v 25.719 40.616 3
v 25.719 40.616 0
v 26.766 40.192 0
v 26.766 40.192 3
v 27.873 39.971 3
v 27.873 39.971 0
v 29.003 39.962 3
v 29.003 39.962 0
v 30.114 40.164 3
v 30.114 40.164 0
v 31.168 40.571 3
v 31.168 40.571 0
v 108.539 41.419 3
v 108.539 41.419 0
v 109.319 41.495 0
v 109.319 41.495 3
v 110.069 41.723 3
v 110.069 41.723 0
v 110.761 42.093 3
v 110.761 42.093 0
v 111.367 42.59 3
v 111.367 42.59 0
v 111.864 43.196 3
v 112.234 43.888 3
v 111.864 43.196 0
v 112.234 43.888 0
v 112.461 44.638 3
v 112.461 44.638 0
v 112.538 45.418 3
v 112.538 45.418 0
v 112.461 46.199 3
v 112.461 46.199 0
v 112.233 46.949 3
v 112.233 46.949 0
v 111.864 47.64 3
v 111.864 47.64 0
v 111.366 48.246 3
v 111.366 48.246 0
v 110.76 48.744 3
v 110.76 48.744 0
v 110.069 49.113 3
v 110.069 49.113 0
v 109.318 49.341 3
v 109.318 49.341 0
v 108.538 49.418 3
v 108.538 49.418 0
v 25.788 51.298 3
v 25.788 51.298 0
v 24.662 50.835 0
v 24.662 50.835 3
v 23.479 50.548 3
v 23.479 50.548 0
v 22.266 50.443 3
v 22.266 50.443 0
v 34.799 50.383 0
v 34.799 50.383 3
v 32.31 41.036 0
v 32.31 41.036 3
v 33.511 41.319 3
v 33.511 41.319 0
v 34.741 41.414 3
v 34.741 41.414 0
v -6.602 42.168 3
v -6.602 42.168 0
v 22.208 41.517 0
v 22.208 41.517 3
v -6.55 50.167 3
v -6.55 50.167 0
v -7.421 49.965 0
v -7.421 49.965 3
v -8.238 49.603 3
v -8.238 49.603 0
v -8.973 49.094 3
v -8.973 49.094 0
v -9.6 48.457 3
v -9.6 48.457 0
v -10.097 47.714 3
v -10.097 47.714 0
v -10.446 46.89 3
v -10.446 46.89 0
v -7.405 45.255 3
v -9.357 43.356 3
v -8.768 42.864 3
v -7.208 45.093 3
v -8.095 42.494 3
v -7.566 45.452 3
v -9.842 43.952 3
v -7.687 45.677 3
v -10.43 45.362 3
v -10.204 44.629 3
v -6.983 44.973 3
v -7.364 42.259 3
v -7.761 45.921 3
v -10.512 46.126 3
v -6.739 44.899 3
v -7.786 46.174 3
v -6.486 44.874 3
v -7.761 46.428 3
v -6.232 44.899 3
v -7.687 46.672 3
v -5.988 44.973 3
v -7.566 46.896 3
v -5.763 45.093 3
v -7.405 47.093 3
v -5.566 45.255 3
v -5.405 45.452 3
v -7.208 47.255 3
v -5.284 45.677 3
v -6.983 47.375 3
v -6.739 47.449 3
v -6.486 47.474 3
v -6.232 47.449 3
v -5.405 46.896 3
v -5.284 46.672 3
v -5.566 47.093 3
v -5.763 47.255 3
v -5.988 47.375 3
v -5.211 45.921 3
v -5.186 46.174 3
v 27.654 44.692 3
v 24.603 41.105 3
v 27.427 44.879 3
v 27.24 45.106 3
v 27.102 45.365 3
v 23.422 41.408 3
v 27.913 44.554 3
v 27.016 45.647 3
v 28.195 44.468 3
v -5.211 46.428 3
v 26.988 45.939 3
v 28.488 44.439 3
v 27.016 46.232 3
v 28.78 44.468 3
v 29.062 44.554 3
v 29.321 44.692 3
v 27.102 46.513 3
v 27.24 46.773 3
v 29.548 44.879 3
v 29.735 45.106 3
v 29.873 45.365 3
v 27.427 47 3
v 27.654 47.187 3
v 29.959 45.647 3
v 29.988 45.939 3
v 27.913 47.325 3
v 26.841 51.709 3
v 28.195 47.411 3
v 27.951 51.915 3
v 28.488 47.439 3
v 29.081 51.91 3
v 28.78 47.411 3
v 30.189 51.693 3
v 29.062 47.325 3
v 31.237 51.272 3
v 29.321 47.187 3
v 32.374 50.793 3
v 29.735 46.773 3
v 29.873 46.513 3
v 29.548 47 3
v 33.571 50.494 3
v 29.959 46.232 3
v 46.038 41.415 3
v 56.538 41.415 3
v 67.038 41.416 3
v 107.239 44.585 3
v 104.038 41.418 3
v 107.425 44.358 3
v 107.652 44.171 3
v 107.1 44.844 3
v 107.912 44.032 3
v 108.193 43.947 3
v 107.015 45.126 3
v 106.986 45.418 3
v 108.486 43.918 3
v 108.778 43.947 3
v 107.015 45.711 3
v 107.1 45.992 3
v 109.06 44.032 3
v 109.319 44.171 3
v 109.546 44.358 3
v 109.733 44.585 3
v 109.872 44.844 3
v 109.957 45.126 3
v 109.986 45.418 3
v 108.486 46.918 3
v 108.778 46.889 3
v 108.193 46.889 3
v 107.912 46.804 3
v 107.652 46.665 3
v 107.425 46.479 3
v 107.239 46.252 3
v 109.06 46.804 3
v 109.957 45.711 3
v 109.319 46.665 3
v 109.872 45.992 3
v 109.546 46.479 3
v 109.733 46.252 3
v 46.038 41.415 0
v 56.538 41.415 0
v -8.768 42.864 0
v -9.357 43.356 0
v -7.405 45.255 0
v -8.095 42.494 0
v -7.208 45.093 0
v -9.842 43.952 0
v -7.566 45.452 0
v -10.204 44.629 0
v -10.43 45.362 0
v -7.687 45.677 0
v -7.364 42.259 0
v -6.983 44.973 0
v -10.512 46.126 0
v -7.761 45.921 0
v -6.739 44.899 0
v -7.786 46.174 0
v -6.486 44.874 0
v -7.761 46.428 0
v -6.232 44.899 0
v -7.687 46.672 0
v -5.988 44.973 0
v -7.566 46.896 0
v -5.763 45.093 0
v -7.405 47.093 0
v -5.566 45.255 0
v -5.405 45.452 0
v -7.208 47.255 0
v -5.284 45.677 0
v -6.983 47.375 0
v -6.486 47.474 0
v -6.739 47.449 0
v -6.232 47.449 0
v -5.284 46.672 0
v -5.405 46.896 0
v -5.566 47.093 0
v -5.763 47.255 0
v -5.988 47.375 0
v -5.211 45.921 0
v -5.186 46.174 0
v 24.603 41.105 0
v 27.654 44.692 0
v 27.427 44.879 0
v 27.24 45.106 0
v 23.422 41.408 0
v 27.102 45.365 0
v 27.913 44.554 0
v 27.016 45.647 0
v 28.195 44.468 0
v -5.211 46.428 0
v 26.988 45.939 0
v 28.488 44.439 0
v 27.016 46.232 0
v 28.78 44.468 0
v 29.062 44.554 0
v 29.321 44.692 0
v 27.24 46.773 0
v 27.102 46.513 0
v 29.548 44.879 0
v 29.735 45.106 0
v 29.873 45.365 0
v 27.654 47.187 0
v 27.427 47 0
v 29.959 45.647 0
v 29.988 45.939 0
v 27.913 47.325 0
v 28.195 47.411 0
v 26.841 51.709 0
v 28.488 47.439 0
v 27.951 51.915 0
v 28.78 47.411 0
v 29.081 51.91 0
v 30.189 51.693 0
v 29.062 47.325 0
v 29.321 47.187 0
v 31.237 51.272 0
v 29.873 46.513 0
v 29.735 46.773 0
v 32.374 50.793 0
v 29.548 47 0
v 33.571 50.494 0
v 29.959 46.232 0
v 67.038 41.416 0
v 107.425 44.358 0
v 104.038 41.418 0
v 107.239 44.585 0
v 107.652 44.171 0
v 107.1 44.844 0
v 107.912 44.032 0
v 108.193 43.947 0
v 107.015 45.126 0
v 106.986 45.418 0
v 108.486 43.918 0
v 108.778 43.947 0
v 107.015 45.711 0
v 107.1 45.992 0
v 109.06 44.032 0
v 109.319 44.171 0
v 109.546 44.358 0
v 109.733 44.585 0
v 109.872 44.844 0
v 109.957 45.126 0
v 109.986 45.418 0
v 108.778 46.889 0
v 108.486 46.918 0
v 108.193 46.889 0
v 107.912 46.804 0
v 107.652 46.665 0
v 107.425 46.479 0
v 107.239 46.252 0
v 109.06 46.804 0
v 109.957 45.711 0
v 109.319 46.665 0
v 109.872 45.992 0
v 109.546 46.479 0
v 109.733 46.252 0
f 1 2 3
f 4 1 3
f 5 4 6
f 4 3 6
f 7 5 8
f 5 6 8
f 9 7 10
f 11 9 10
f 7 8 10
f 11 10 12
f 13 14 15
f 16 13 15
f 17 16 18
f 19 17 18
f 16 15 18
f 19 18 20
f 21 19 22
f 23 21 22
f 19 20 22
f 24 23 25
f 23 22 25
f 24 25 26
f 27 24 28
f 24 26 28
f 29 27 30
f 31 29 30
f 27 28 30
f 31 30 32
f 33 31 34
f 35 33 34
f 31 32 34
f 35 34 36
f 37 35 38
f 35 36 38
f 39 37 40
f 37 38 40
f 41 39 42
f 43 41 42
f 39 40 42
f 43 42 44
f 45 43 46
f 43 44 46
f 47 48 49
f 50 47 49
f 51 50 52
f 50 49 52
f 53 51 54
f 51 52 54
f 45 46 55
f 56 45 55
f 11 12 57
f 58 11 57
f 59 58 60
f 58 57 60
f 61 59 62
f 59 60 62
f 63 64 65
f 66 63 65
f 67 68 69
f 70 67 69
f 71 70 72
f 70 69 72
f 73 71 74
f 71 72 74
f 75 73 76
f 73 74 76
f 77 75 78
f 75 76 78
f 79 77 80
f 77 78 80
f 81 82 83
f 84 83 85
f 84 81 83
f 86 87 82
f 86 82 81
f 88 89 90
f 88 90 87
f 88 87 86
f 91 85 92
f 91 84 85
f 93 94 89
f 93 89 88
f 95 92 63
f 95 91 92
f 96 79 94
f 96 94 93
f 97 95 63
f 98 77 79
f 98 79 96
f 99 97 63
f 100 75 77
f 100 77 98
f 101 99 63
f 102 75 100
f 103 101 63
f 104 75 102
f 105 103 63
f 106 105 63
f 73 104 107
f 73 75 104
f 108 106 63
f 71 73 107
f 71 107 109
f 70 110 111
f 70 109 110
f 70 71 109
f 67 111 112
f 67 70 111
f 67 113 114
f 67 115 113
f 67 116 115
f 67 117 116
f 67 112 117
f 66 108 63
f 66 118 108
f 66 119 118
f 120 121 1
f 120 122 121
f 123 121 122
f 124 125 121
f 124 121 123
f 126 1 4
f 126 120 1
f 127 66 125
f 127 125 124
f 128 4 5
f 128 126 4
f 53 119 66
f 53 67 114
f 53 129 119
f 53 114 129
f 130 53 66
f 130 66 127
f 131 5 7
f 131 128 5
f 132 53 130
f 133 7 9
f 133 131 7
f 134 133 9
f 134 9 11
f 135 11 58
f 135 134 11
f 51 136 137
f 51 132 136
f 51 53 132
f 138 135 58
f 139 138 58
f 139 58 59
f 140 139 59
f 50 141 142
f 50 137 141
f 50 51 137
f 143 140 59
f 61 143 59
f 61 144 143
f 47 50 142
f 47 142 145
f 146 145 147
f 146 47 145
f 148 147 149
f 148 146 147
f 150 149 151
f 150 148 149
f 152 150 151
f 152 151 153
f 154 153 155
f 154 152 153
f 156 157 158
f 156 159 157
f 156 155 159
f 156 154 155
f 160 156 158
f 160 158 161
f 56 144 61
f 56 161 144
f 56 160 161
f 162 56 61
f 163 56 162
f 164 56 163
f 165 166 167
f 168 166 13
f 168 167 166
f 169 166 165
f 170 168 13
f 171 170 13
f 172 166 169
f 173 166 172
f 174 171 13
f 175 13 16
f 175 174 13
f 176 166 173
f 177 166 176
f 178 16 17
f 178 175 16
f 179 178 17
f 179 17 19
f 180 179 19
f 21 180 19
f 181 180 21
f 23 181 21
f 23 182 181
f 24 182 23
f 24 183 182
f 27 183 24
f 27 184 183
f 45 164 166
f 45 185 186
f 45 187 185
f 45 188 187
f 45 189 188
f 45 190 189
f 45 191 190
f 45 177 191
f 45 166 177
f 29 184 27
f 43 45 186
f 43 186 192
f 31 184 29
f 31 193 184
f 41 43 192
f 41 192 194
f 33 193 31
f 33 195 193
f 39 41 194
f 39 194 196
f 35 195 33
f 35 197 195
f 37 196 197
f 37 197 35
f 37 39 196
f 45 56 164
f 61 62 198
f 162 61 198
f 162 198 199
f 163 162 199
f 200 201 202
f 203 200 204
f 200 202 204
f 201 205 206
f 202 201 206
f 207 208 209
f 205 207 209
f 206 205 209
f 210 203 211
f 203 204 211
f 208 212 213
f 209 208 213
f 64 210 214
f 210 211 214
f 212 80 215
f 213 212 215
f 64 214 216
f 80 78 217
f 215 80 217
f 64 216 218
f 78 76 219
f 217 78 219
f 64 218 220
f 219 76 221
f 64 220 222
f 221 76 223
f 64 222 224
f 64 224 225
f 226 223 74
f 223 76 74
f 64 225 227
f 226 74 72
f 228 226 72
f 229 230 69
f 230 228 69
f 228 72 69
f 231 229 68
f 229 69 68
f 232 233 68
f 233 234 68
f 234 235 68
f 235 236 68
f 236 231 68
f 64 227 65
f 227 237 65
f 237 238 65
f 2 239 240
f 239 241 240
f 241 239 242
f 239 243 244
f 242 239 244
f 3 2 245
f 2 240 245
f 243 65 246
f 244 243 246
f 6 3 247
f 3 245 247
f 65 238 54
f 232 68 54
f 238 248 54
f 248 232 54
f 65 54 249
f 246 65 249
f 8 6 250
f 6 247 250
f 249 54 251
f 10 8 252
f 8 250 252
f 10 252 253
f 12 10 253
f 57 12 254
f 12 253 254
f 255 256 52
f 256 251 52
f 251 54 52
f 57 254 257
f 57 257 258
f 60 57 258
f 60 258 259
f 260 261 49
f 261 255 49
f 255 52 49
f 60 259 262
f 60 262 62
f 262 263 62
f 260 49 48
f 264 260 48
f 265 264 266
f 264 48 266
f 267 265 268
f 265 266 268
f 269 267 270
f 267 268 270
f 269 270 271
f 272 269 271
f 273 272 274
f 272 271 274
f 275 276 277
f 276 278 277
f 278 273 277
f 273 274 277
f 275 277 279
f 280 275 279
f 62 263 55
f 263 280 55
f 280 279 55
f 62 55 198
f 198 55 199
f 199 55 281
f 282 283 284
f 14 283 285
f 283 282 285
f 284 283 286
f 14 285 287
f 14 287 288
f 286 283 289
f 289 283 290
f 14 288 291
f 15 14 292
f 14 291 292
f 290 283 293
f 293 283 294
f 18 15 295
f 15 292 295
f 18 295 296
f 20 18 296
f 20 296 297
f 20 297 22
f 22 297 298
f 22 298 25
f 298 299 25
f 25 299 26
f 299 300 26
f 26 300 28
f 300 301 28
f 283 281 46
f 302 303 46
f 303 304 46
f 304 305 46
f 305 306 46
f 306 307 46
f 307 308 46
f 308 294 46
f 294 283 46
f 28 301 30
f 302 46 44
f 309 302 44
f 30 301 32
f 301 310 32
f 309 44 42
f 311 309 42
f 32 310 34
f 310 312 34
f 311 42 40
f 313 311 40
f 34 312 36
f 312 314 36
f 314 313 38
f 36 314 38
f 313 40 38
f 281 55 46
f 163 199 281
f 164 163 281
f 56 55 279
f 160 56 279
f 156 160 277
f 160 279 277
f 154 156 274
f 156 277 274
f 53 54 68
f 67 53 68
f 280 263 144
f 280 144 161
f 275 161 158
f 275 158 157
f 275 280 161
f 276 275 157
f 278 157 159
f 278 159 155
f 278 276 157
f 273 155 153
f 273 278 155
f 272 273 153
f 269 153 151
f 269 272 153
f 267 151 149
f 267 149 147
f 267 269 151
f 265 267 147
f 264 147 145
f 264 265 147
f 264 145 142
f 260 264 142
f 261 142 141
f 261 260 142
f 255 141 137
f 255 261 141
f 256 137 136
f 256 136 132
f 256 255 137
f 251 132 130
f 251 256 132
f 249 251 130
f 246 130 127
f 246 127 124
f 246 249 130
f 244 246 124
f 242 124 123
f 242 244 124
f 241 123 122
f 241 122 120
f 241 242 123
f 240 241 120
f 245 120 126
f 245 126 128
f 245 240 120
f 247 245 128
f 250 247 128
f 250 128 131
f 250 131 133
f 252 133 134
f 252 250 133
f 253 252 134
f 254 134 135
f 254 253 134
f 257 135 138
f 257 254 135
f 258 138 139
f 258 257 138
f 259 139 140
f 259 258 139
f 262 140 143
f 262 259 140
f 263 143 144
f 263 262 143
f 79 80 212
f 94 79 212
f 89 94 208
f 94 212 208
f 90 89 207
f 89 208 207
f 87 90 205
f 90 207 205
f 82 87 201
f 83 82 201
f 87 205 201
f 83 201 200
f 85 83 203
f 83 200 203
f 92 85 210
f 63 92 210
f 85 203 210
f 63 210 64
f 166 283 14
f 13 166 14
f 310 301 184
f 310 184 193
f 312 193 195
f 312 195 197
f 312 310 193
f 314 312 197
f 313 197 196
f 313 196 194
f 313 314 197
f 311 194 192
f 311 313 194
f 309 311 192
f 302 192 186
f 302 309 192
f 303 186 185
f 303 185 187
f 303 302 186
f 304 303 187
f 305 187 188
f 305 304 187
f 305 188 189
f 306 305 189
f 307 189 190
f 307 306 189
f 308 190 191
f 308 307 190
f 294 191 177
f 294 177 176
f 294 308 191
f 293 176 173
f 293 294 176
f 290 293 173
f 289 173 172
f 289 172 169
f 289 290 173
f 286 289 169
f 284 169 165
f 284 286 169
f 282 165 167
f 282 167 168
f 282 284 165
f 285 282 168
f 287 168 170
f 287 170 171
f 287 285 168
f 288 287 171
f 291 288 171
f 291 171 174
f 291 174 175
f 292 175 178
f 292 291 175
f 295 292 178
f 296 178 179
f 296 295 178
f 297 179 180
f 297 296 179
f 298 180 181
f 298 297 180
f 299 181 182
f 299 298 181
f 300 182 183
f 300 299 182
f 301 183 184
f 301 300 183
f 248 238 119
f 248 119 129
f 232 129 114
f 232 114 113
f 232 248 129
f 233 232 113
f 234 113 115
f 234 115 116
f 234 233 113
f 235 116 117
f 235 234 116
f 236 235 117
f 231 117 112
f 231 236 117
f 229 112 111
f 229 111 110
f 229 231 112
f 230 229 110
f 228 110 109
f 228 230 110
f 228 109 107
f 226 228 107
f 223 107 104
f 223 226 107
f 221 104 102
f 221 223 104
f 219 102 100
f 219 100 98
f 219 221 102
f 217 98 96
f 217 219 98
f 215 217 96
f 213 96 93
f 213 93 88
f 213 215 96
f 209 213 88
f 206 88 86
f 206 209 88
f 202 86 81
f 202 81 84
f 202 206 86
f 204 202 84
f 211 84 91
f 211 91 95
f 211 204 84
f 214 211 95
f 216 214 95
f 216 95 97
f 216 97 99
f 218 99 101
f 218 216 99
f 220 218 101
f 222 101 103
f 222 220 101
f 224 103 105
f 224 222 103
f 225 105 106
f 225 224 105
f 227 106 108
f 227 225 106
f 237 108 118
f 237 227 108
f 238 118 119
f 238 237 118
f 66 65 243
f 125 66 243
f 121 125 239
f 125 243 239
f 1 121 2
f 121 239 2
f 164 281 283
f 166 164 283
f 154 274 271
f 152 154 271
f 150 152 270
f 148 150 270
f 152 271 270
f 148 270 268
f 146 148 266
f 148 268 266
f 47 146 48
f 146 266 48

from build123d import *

# Parameters (mm, degrees)
MODEL_R             = 1.5
MODEL_R_2           = 1.3
BOSS_EXTRUDE1_DEPTH = 3


with BuildPart() as part:
    # Model → Boss-Extrude1 (new body)
    with BuildSketch(Plane.XY):
        with BuildLine():
            Line((67.038441792, 41.415856749), (104.038441639, 41.418238239))
            Line((104.038441639, 41.418238239), (108.538521807, 41.418527884))
            ThreePointArc((108.538521807, 41.418527884), (112.537988752, 45.418317376), (108.53819926, 49.417784321))
            Line((108.53819926, 49.417784321), (34.799117207, 50.383081783))
            ThreePointArc((34.799117207, 50.383081783), (32.966554958, 50.620533228), (31.23734869, 51.272080055))
            ThreePointArc((31.23734869, 51.272080055), (28.515998073, 51.939320982), (25.788421234, 51.298006533))
            ThreePointArc((25.788421234, 51.298006533), (24.076314539, 50.668969798), (22.266330888, 50.443236041))
            Line((22.266330888, 50.443236041), (-6.550050988, 50.167207177))
            ThreePointArc((-6.550050988, 50.167207177), (-8.973297656, 49.093954733), (-10.445895761, 46.890446157))
            ThreePointArc((-10.445895761, 46.890446157), (-9.613967932, 43.642213171), (-6.602156551, 42.168403941))
            Line((-6.602156551, 42.168403941), (22.208184202, 41.516932419))
            ThreePointArc((22.208184202, 41.516932419), (24.01842496, 41.280561161), (25.718896078, 40.616301461))
            ThreePointArc((25.718896078, 40.616301461), (28.43787871, 39.93957832), (31.167673514, 40.571275311))
            ThreePointArc((31.167673514, 40.571275311), (32.905215524, 41.200228691), (34.740707643, 41.413777918))
            Line((34.740707643, 41.413777918), (46.038441879, 41.414505092))
            Line((46.038441879, 41.414505092), (56.538441836, 41.415180921))
            Line((56.538441836, 41.415180921), (67.038441792, 41.415856749))
        make_face()
        with Locations((28.487510706, 45.939417458)):
            Circle(MODEL_R, mode=Mode.SUBTRACT)
        with Locations((108.485791619, 45.418177884)):
            Circle(MODEL_R, mode=Mode.SUBTRACT)
        with Locations((-6.485524229, 46.174255041)):
            Circle(MODEL_R_2, mode=Mode.SUBTRACT)
    extrude(amount=BOSS_EXTRUDE1_DEPTH)


solid = part.part
